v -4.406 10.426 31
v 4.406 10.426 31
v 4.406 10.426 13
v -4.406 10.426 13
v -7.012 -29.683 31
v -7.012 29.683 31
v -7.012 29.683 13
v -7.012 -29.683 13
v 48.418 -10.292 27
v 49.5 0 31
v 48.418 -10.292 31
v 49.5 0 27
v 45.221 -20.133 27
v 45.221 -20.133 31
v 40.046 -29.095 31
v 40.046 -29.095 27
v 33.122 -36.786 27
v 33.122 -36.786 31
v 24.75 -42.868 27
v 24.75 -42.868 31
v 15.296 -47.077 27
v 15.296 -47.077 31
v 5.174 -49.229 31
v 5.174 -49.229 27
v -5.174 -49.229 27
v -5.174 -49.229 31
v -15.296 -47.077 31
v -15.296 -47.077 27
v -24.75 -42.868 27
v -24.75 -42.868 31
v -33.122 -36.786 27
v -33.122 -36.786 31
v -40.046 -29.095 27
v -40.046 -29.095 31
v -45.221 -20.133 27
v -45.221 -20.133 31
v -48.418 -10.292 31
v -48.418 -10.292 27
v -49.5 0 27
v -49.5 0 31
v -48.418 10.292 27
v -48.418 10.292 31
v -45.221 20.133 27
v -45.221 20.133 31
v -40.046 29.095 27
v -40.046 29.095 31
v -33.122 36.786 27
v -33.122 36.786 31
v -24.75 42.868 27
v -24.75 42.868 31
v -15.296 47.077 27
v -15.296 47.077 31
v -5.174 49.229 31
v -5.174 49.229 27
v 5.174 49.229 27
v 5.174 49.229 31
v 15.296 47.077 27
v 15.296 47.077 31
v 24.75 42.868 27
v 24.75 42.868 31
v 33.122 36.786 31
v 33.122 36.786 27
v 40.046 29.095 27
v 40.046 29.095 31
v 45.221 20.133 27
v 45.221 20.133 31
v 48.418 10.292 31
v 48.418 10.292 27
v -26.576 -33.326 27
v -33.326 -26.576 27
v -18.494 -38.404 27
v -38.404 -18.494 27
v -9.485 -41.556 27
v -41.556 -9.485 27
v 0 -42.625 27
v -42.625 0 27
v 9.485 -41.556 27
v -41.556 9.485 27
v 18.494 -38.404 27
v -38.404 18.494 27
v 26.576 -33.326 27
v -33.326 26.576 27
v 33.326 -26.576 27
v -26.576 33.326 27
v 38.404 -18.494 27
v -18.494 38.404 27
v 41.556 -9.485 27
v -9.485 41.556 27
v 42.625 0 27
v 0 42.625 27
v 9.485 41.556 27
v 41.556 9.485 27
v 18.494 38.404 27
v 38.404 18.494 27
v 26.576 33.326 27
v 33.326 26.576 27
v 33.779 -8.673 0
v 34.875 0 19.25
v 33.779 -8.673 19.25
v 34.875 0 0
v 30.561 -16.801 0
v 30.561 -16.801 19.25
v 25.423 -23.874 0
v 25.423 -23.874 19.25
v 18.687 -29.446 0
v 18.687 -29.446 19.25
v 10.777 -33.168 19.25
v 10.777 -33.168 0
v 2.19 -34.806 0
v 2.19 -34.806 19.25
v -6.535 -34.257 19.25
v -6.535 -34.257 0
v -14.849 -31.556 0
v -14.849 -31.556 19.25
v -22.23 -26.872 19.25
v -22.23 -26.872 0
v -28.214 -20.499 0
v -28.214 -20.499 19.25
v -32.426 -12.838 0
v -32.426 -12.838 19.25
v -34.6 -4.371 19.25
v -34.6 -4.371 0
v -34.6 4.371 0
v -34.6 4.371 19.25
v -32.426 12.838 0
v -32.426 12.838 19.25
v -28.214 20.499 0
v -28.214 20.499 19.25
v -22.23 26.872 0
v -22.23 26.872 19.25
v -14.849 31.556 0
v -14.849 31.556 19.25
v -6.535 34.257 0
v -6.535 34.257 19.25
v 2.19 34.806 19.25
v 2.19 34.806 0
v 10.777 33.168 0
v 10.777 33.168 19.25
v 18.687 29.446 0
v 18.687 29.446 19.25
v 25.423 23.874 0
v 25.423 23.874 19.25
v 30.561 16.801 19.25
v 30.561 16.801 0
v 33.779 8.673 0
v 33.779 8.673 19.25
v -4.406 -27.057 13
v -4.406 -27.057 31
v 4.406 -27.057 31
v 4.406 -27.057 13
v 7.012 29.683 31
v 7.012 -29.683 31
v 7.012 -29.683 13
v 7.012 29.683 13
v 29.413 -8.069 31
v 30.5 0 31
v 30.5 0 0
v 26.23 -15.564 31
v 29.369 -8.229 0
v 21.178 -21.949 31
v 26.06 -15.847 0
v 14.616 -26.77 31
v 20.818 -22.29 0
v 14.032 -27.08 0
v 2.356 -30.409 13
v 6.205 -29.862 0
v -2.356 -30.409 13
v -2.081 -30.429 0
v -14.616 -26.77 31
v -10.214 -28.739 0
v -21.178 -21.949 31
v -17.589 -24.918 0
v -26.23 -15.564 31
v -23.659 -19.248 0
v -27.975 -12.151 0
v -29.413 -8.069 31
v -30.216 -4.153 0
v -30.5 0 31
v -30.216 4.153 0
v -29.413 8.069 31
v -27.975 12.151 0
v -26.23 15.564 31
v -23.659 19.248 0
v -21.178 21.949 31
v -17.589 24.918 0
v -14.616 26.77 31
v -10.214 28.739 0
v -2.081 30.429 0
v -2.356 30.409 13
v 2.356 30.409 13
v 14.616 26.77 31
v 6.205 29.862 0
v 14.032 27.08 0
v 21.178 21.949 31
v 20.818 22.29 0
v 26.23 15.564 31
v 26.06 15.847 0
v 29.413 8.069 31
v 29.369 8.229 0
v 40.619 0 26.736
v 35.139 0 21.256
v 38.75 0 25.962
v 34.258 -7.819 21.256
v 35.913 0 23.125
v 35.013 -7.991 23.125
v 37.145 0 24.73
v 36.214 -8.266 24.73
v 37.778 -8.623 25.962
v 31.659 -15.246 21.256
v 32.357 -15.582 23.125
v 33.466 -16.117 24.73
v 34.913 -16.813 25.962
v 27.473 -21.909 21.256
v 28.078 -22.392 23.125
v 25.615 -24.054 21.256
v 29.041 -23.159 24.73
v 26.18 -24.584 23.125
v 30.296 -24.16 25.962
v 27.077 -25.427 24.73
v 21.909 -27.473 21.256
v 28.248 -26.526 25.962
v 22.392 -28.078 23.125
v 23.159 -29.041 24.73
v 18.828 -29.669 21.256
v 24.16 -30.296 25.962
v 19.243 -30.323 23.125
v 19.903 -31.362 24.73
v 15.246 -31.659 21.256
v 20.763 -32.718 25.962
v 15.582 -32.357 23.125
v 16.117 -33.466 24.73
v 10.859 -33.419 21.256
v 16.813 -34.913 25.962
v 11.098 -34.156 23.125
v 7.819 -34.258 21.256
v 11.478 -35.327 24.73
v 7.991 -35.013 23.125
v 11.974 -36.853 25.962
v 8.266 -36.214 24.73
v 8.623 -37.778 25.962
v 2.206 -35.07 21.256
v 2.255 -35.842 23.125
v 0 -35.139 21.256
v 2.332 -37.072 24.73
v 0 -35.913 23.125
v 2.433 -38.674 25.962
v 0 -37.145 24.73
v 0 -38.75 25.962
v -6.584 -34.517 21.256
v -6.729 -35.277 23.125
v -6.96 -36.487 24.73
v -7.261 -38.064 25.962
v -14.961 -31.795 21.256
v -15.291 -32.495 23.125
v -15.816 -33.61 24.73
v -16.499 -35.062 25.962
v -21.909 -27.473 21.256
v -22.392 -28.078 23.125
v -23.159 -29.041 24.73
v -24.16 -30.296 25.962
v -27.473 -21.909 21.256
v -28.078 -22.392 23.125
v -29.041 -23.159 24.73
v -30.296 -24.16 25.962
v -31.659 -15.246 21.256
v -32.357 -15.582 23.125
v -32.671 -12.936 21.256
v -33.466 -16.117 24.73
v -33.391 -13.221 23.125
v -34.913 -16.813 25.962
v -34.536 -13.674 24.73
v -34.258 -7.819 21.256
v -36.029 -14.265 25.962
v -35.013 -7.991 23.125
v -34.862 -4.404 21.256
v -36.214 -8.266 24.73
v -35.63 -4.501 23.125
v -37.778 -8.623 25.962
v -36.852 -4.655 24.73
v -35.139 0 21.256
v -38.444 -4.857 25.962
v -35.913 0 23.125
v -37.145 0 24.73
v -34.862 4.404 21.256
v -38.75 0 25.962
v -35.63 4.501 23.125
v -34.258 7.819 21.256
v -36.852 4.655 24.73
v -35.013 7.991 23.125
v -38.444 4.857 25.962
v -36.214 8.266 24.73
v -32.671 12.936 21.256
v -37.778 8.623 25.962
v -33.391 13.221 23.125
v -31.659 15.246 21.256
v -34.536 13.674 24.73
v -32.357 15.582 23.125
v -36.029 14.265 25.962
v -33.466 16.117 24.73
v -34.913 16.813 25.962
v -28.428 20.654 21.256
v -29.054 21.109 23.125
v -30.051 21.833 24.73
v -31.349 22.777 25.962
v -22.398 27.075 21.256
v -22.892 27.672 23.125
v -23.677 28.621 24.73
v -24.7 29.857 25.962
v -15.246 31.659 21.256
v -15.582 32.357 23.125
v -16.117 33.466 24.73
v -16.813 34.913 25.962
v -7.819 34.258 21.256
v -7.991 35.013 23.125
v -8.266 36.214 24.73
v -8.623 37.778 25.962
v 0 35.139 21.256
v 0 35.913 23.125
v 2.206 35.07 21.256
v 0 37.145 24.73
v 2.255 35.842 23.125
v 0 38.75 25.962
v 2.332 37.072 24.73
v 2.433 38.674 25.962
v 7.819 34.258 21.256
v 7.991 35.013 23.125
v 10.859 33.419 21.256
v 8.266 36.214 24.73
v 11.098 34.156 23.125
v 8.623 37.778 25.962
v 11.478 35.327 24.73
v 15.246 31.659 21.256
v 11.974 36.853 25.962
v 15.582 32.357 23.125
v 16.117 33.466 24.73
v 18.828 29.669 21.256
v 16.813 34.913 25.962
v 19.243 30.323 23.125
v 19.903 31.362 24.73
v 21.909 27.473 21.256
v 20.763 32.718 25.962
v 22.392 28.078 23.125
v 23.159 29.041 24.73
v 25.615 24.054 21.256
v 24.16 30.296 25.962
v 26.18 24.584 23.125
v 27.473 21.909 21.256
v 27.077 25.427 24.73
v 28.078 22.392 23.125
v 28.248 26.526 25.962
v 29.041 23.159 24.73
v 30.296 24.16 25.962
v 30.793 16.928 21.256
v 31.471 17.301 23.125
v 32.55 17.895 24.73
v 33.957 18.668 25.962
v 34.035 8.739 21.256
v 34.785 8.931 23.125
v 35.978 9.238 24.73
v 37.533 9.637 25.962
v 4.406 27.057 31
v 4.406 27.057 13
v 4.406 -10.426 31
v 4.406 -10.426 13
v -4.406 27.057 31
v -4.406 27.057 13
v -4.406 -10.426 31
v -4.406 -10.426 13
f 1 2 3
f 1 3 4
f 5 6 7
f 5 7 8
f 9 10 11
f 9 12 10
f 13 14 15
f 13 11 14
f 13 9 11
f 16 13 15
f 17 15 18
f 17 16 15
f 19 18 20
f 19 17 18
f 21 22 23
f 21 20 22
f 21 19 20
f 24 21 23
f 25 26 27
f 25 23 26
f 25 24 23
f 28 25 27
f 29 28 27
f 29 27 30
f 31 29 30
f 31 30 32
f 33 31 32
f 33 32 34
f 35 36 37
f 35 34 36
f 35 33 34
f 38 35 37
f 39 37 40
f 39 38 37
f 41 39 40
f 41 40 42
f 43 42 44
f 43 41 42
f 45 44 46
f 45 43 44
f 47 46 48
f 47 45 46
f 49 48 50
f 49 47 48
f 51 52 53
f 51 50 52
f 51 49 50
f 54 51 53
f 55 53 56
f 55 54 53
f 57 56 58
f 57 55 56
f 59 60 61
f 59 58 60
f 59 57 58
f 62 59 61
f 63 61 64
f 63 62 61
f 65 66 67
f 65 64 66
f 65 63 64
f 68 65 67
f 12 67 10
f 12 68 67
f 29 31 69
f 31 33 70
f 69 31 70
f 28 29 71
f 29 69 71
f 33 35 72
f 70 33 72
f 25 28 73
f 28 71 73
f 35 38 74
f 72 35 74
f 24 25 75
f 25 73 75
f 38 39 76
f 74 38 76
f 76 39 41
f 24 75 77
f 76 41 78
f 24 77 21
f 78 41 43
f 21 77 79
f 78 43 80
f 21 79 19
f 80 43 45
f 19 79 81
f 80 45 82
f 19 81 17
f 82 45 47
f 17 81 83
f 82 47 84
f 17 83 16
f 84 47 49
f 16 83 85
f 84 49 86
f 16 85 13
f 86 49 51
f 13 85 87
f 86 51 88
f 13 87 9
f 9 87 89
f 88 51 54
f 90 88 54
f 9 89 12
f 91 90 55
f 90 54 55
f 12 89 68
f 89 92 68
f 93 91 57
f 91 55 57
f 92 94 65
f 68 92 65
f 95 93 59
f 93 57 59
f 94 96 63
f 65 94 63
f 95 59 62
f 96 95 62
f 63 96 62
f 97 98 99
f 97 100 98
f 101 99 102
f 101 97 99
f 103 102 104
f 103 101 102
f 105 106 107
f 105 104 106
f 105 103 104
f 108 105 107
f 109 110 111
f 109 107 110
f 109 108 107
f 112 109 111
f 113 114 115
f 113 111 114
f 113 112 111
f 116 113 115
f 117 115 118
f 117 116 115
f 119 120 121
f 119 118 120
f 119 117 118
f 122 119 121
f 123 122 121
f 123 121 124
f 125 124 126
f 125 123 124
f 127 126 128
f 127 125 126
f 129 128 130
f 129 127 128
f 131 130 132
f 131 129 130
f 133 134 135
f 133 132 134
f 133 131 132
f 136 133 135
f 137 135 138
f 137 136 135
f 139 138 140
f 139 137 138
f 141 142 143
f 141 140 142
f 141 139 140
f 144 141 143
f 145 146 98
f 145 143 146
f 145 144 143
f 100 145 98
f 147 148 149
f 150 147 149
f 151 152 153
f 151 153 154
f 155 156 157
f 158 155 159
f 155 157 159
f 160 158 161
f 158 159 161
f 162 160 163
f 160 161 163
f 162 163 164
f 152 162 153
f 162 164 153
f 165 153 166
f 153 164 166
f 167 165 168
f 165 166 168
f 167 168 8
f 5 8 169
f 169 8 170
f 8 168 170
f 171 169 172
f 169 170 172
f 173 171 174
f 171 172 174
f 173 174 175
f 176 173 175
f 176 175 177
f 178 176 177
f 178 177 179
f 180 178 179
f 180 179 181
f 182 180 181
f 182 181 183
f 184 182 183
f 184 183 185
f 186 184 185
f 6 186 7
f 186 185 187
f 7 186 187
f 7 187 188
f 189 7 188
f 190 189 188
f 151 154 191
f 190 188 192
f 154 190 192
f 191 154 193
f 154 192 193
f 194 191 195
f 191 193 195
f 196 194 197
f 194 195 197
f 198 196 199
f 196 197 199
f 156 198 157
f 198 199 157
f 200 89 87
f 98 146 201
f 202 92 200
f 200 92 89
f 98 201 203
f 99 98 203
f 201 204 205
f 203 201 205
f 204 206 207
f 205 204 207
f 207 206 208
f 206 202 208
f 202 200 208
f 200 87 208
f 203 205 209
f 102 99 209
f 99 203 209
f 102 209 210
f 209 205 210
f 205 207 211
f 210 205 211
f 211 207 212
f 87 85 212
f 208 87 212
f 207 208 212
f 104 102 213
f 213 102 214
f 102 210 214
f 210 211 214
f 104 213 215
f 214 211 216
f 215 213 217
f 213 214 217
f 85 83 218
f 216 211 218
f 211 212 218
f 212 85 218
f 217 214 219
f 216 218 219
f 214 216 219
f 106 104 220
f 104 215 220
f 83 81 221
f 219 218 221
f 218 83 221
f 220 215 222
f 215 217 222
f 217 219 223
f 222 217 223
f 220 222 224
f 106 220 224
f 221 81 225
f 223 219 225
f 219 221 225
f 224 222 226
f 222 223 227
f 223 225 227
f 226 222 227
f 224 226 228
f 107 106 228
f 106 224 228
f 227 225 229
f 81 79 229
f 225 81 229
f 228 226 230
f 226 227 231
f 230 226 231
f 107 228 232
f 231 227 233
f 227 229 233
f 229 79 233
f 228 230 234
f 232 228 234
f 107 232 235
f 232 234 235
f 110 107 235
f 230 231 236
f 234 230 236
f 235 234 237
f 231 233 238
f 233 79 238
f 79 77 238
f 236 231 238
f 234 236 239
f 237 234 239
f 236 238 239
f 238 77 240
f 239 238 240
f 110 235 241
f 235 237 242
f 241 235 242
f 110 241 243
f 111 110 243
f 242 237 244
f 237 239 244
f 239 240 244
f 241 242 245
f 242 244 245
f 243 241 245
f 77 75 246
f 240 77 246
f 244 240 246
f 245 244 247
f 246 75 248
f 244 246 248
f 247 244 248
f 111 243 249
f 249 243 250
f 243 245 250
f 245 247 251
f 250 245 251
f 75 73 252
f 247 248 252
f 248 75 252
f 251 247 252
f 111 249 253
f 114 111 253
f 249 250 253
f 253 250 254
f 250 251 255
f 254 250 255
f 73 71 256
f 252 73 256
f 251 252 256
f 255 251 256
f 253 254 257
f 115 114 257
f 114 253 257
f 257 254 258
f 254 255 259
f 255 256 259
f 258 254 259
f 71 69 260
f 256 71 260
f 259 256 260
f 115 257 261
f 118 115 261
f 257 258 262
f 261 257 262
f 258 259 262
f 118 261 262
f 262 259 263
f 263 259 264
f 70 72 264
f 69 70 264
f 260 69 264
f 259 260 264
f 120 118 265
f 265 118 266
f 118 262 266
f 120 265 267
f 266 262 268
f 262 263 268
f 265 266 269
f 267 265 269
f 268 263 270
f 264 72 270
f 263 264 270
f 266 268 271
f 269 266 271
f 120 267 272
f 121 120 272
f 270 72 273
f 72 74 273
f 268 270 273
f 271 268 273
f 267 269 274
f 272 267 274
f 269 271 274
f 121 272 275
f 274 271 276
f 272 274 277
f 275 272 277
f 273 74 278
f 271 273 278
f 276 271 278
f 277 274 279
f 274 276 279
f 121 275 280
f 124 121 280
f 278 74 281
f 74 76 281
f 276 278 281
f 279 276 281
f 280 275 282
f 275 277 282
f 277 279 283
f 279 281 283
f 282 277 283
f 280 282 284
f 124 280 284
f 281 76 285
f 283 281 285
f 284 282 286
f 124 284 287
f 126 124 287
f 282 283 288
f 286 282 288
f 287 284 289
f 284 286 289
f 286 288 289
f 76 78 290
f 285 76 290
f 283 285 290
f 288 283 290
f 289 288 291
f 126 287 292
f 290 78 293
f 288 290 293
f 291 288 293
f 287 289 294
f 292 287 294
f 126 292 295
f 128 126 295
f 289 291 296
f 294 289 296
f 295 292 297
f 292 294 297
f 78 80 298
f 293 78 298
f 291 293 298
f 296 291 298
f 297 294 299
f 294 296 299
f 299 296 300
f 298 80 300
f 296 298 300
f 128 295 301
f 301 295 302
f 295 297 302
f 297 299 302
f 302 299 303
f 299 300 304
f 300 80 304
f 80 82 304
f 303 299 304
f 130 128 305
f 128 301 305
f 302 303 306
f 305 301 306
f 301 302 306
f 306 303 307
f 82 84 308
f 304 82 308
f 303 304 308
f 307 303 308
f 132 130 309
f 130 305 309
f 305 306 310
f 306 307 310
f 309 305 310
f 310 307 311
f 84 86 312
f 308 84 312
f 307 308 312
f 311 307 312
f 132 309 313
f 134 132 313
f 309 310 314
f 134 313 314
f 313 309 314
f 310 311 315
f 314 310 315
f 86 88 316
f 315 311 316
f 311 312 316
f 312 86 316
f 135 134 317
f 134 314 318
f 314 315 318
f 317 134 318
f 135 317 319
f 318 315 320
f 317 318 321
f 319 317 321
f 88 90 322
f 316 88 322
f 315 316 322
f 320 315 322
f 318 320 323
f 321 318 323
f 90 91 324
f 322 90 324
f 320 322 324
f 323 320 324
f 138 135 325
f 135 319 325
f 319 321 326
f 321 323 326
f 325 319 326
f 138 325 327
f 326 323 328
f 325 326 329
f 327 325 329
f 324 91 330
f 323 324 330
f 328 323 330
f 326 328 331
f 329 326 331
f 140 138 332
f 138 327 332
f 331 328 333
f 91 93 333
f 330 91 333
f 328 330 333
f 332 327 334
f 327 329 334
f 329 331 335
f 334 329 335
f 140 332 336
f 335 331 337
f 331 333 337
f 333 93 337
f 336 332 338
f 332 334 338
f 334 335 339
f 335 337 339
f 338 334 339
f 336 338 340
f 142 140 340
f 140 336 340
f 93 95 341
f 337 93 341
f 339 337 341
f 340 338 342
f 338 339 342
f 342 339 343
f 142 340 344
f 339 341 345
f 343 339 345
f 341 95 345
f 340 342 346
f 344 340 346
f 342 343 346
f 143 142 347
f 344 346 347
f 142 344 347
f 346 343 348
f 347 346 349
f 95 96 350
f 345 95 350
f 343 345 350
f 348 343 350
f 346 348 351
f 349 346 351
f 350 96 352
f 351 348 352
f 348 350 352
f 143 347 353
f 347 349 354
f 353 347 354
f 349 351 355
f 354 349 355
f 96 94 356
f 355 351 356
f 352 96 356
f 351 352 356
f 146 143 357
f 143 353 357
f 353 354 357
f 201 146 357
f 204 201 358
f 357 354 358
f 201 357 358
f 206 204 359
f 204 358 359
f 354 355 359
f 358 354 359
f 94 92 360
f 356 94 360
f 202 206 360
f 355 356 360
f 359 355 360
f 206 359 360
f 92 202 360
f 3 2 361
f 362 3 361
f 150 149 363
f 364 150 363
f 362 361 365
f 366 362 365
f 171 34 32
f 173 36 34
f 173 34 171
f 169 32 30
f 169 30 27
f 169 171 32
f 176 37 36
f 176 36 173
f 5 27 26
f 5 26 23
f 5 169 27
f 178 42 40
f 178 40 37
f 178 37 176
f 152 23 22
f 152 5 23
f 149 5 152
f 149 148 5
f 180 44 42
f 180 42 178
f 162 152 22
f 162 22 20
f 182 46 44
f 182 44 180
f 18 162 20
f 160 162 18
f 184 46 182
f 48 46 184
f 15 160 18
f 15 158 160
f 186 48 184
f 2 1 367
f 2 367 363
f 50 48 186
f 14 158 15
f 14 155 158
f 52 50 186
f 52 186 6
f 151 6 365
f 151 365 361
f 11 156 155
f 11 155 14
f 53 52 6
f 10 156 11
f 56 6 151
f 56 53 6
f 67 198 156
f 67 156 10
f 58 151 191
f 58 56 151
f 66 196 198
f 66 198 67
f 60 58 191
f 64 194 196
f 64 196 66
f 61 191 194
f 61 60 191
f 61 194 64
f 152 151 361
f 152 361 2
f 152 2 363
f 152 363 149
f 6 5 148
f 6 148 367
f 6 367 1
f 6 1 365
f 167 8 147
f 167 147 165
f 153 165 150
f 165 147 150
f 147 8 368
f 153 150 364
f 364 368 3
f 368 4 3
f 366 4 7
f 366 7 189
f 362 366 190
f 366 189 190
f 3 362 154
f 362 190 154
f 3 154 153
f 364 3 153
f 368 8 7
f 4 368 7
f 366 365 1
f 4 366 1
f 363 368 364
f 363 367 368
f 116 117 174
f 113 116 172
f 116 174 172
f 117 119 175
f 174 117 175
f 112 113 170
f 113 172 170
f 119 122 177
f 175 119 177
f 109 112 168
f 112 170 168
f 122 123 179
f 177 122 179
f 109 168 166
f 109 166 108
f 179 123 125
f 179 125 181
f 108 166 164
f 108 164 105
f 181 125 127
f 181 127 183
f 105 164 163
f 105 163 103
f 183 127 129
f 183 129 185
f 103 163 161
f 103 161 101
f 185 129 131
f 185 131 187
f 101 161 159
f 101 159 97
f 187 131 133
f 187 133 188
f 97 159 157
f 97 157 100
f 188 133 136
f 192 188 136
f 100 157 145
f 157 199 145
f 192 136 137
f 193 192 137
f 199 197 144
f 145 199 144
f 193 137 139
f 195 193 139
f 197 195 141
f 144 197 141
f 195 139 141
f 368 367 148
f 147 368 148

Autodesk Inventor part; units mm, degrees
ref_plane "YZ Plane" through (0, 0, 0) normal (1, 0, 0) x (0, 1, 0)
ref_plane "XZ Plane" through (0, 0, 0) normal (0, 1, 0) x (-1, 0, 0)
ref_plane "XY Plane" through (0, 0, 0) normal (0, 0, 1) x (1, 0, 0)
sketch "Boceto1" plane through (0, 0, 0) normal (0, 0, 1) x (1, 0, 0)
  circle A0 centre (0, 0) radius 30.5
  circle A1 centre (0, 0) radius 34.875
  dimension "d0" = 61
  dimension "d1" = 69.75
extrude "Extrusión1" add sketch "Boceto1" along normal blind 27
sketch "Boceto2" plane through (0, 0, 27) normal (0, 0, 1) x (1, 0, 0)
  circle A0 centre (0, 0) radius 35.0049
  circle A1 centre (0, 0) radius 30.5
  circle A2 centre (0, 0) radius 49.5
  dimension "d4" = 19
extrude "Extrusión2" add sketch "Boceto2" along normal blind 4 contours A0 | A2
sketch "Boceto3" plane through (0, 0, 27) normal (0, 0, -1) x (-1, 0, 0)
  point P0 (0, 0)
fillet "Empalme1" radius 7.75 1 edges at (-34.875, 0, 27)
sketch "Boceto4" plane through (0, 0, 0) normal (0, 0, -1) x (-1, 0, 0)
  circle A0 centre (0, 0) radius 31.639
  line L0 (-6.5155, -30.9609) -> (6.5155, -30.9609)
  line L1 (6.5155, -30.9609) -> (6.5155, 30.9609)
  line L2 (6.5155, 30.9609) -> (-6.5155, 30.9609)
  line L3 (-6.5155, 30.9609) -> (-6.5155, -30.9609)
  line L4 (-6.5155, -30.9609) -> (6.5155, 30.9609) construction
  line L5 (6.5155, -30.9609) -> (-6.5155, 30.9609) construction
sketch "Boceto5" plane through (0, 0, 31) normal (0, 0, 1) x (1, 0, 0)
  line L0 (-7.0125, -31.5254) -> (7.0125, -31.5254)
  line L1 (7.0125, -31.5254) -> (7.0125, 31.5254)
  line L2 (7.0125, 31.5254) -> (-7.0125, 31.5254)
  line L3 (-7.0125, 31.5254) -> (-7.0125, -31.5254)
  line L4 (-7.0125, -31.5254) -> (7.0125, 31.5254) construction
  line L5 (7.0125, -31.5254) -> (-7.0125, 31.5254) construction
  line L6 (-4.4061, -27.0572) -> (4.4061, -27.0572)
  line L7 (4.4061, -27.0572) -> (4.4061, 27.0572)
  line L8 (4.4061, 27.0572) -> (-4.4061, 27.0572)
  line L9 (-4.4061, 27.0572) -> (-4.4061, -27.0572)
  line L10 (-4.4061, -27.0572) -> (4.4061, 27.0572) construction
  line L11 (4.4061, -27.0572) -> (-4.4061, 27.0572) construction
  line L12 (-4.4061, -10.4257) -> (4.4061, -10.4257)
  line L13 (4.4061, -10.4257) -> (4.4061, 10.4257)
  line L14 (4.4061, 10.4257) -> (-4.4061, 10.4257)
  line L15 (-4.4061, 10.4257) -> (-4.4061, -10.4257)
  line L16 (-4.4061, -10.4257) -> (4.4061, 10.4257) construction
  line L17 (4.4061, -10.4257) -> (-4.4061, 10.4257) construction
  point P0 (0, 0)
extrude "Extrusión3" add sketch "Boceto5" against normal blind 18 contours L3 L2 L1 L0 | L9 L14 L7 L12
properties part number "Base_robot_base_3DPrint"
